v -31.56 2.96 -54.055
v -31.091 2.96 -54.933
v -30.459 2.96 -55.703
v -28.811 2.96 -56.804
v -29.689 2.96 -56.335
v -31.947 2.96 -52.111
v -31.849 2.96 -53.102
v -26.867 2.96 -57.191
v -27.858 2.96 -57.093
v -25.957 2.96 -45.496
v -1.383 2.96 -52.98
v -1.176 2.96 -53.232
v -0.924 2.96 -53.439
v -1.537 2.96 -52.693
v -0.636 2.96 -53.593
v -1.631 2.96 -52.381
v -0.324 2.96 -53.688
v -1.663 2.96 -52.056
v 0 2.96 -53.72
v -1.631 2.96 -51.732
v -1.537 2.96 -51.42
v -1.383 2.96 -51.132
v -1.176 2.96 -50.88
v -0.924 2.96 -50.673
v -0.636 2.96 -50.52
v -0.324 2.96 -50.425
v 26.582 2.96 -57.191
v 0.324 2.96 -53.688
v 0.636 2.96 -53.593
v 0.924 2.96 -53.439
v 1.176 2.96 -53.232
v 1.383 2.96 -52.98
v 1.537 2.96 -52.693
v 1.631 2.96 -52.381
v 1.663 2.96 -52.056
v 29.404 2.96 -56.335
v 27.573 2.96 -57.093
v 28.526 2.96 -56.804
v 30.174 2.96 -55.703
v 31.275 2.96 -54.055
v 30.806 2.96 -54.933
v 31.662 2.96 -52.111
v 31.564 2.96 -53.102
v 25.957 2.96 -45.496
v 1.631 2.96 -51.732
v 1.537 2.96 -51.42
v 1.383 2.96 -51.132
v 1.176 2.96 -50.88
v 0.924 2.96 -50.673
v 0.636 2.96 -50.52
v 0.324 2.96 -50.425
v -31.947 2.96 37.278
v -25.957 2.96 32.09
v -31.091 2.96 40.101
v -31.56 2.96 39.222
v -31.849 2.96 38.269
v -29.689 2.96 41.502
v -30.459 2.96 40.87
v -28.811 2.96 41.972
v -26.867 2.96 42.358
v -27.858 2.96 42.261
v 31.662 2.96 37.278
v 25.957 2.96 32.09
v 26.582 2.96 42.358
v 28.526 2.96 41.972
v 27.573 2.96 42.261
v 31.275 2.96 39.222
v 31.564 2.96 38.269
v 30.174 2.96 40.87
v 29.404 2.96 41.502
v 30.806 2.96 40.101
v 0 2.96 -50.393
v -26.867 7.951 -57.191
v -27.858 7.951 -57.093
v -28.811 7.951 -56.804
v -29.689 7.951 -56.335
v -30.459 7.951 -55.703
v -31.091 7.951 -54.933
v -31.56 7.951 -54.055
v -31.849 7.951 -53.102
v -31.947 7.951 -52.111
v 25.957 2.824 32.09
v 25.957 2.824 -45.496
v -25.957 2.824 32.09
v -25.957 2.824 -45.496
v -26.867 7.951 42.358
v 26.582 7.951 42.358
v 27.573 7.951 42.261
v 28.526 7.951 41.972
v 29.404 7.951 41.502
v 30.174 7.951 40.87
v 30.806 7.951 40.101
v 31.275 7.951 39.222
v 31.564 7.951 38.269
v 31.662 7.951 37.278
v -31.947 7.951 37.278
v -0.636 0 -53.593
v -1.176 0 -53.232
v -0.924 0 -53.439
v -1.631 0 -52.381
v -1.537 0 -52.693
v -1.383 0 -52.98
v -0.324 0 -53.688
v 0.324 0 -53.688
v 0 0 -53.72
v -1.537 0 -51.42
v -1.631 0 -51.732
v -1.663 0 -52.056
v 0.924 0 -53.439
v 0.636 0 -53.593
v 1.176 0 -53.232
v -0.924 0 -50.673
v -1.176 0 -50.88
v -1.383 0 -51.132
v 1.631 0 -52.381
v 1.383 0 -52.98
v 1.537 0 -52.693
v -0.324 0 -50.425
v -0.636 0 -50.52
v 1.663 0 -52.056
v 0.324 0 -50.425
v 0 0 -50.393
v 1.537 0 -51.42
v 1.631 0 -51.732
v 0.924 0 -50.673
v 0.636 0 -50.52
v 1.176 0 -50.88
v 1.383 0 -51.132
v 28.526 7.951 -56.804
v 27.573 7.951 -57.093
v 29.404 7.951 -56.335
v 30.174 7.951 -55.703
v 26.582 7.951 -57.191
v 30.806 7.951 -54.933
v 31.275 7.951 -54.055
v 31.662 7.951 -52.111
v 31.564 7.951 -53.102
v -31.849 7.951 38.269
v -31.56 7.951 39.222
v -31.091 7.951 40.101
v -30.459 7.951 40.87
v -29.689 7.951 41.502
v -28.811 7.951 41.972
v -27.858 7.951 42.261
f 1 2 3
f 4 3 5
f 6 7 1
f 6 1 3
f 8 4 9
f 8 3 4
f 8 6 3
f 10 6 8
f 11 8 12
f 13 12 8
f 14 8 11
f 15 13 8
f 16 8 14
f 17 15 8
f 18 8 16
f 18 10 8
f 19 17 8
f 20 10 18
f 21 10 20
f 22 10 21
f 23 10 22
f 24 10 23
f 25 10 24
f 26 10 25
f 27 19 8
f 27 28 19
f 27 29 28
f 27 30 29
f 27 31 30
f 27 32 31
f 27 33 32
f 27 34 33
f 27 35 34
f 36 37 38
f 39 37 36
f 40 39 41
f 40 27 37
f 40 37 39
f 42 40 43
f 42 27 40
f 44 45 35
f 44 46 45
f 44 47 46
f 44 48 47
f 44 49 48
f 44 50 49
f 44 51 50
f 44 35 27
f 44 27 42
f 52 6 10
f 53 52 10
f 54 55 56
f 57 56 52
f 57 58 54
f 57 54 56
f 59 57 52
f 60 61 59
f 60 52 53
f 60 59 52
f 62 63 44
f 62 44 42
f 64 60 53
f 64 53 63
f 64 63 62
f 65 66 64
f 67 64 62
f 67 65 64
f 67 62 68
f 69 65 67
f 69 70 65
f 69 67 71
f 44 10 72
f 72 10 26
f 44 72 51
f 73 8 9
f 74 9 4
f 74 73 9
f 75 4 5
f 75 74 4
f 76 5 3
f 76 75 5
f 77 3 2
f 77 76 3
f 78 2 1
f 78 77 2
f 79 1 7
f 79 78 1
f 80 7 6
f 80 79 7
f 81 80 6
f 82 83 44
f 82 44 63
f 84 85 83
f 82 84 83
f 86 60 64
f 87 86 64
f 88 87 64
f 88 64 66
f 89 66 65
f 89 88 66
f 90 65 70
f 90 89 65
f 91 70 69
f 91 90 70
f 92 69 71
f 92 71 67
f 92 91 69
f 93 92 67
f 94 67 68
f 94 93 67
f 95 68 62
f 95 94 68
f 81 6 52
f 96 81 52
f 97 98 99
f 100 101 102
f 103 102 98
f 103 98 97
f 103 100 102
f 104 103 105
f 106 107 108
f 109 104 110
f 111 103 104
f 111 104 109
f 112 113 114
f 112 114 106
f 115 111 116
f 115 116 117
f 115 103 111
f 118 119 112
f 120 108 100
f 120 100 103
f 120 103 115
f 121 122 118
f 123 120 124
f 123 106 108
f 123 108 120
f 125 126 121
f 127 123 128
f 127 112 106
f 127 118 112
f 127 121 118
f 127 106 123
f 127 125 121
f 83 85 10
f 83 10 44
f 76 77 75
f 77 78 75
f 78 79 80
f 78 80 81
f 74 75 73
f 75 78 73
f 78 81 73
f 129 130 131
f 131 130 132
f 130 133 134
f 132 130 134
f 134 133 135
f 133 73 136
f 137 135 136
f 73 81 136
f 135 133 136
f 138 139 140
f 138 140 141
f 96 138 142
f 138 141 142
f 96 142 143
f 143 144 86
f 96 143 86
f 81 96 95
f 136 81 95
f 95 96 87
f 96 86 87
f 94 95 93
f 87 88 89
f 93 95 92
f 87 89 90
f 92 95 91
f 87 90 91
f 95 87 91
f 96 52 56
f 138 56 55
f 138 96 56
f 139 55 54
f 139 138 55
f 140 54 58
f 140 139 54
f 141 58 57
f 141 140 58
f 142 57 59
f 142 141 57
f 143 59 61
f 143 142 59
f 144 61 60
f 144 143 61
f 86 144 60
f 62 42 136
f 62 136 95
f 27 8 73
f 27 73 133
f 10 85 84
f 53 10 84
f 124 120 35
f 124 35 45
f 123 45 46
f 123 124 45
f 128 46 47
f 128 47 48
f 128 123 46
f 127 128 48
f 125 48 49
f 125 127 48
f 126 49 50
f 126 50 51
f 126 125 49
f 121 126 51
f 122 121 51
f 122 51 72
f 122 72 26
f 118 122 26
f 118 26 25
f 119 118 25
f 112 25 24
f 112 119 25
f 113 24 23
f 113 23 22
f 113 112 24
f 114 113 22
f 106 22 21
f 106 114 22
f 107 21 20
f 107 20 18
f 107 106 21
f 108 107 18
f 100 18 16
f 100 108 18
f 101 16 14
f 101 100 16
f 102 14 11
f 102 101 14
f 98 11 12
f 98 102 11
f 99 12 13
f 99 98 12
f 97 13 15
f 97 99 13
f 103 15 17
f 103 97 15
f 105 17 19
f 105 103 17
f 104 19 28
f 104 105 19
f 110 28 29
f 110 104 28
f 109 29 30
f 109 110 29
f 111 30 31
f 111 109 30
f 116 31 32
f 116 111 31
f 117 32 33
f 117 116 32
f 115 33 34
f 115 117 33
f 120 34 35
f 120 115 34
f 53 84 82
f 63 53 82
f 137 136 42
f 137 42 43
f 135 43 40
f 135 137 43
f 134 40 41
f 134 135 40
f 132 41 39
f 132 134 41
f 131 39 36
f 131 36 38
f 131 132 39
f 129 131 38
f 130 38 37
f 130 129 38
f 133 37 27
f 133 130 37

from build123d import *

# Parameters (mm, degrees)
F0_W      = 63.608665
F0_H      = 99.548988
F2_DEPTH  = 7.95075
F3_R      = 5.08
F4_R      = 5.08
F5_R      = 5.08
F6_R      = 5.08
F8_W      = 63.608665
F8_H      = 99.548988
F8_R      = 1.663226
F8_W_2    = 51.913798
F8_H_2    = 77.585458
F9_DEPTH  = 2.95953
F1_W      = 51.913798
F1_H      = 77.585458
F10_DEPTH = 2.82358


with BuildPart() as f2:
    # F0 (on Front) → F2 (new body)
    with BuildSketch(Plane.XZ):
        with Locations((-0.14262, -7.416256)):
            Rectangle(F0_W, F0_H)
    extrude(amount=-F2_DEPTH)

    # F3
    f3_edges = [f2.edges().sort_by_distance(p)[0] for p in [
        (-31.946953, 3.975375, 42.358238),
    ]]
    fillet(f3_edges, radius=F3_R)

    # F4
    f4_edges = [f2.edges().sort_by_distance(p)[0] for p in [
        (31.661712, 3.975375, 42.358238),
    ]]
    fillet(f4_edges, radius=F4_R)

    # F5
    f5_edges = [f2.edges().sort_by_distance(p)[0] for p in [
        (31.661712, 3.975375, -57.19075),
    ]]
    fillet(f5_edges, radius=F5_R)

    # F6
    f6_edges = [f2.edges().sort_by_distance(p)[0] for p in [
        (-31.946953, 3.975375, -57.19075),
    ]]
    fillet(f6_edges, radius=F6_R)

    # F8 (on face) → F9 (cut)
    with BuildSketch(Plane.XZ):
        with Locations((-0.14262, -7.416256)):
            Rectangle(F8_W, F8_H)
        with Locations((0, -52.056417)):
            Circle(F8_R, mode=Mode.SUBTRACT)
        with Locations((0, -6.703157)):
            Rectangle(F8_W_2, F8_H_2, mode=Mode.SUBTRACT)
    extrude(amount=-F9_DEPTH, mode=Mode.SUBTRACT)

    # F1 (on face) → F10 (cut)
    with BuildSketch(Plane.XZ):
        with Locations((0, -6.703157)):
            Rectangle(F1_W, F1_H)
    extrude(amount=-F10_DEPTH, mode=Mode.SUBTRACT)


solid = f2.part
